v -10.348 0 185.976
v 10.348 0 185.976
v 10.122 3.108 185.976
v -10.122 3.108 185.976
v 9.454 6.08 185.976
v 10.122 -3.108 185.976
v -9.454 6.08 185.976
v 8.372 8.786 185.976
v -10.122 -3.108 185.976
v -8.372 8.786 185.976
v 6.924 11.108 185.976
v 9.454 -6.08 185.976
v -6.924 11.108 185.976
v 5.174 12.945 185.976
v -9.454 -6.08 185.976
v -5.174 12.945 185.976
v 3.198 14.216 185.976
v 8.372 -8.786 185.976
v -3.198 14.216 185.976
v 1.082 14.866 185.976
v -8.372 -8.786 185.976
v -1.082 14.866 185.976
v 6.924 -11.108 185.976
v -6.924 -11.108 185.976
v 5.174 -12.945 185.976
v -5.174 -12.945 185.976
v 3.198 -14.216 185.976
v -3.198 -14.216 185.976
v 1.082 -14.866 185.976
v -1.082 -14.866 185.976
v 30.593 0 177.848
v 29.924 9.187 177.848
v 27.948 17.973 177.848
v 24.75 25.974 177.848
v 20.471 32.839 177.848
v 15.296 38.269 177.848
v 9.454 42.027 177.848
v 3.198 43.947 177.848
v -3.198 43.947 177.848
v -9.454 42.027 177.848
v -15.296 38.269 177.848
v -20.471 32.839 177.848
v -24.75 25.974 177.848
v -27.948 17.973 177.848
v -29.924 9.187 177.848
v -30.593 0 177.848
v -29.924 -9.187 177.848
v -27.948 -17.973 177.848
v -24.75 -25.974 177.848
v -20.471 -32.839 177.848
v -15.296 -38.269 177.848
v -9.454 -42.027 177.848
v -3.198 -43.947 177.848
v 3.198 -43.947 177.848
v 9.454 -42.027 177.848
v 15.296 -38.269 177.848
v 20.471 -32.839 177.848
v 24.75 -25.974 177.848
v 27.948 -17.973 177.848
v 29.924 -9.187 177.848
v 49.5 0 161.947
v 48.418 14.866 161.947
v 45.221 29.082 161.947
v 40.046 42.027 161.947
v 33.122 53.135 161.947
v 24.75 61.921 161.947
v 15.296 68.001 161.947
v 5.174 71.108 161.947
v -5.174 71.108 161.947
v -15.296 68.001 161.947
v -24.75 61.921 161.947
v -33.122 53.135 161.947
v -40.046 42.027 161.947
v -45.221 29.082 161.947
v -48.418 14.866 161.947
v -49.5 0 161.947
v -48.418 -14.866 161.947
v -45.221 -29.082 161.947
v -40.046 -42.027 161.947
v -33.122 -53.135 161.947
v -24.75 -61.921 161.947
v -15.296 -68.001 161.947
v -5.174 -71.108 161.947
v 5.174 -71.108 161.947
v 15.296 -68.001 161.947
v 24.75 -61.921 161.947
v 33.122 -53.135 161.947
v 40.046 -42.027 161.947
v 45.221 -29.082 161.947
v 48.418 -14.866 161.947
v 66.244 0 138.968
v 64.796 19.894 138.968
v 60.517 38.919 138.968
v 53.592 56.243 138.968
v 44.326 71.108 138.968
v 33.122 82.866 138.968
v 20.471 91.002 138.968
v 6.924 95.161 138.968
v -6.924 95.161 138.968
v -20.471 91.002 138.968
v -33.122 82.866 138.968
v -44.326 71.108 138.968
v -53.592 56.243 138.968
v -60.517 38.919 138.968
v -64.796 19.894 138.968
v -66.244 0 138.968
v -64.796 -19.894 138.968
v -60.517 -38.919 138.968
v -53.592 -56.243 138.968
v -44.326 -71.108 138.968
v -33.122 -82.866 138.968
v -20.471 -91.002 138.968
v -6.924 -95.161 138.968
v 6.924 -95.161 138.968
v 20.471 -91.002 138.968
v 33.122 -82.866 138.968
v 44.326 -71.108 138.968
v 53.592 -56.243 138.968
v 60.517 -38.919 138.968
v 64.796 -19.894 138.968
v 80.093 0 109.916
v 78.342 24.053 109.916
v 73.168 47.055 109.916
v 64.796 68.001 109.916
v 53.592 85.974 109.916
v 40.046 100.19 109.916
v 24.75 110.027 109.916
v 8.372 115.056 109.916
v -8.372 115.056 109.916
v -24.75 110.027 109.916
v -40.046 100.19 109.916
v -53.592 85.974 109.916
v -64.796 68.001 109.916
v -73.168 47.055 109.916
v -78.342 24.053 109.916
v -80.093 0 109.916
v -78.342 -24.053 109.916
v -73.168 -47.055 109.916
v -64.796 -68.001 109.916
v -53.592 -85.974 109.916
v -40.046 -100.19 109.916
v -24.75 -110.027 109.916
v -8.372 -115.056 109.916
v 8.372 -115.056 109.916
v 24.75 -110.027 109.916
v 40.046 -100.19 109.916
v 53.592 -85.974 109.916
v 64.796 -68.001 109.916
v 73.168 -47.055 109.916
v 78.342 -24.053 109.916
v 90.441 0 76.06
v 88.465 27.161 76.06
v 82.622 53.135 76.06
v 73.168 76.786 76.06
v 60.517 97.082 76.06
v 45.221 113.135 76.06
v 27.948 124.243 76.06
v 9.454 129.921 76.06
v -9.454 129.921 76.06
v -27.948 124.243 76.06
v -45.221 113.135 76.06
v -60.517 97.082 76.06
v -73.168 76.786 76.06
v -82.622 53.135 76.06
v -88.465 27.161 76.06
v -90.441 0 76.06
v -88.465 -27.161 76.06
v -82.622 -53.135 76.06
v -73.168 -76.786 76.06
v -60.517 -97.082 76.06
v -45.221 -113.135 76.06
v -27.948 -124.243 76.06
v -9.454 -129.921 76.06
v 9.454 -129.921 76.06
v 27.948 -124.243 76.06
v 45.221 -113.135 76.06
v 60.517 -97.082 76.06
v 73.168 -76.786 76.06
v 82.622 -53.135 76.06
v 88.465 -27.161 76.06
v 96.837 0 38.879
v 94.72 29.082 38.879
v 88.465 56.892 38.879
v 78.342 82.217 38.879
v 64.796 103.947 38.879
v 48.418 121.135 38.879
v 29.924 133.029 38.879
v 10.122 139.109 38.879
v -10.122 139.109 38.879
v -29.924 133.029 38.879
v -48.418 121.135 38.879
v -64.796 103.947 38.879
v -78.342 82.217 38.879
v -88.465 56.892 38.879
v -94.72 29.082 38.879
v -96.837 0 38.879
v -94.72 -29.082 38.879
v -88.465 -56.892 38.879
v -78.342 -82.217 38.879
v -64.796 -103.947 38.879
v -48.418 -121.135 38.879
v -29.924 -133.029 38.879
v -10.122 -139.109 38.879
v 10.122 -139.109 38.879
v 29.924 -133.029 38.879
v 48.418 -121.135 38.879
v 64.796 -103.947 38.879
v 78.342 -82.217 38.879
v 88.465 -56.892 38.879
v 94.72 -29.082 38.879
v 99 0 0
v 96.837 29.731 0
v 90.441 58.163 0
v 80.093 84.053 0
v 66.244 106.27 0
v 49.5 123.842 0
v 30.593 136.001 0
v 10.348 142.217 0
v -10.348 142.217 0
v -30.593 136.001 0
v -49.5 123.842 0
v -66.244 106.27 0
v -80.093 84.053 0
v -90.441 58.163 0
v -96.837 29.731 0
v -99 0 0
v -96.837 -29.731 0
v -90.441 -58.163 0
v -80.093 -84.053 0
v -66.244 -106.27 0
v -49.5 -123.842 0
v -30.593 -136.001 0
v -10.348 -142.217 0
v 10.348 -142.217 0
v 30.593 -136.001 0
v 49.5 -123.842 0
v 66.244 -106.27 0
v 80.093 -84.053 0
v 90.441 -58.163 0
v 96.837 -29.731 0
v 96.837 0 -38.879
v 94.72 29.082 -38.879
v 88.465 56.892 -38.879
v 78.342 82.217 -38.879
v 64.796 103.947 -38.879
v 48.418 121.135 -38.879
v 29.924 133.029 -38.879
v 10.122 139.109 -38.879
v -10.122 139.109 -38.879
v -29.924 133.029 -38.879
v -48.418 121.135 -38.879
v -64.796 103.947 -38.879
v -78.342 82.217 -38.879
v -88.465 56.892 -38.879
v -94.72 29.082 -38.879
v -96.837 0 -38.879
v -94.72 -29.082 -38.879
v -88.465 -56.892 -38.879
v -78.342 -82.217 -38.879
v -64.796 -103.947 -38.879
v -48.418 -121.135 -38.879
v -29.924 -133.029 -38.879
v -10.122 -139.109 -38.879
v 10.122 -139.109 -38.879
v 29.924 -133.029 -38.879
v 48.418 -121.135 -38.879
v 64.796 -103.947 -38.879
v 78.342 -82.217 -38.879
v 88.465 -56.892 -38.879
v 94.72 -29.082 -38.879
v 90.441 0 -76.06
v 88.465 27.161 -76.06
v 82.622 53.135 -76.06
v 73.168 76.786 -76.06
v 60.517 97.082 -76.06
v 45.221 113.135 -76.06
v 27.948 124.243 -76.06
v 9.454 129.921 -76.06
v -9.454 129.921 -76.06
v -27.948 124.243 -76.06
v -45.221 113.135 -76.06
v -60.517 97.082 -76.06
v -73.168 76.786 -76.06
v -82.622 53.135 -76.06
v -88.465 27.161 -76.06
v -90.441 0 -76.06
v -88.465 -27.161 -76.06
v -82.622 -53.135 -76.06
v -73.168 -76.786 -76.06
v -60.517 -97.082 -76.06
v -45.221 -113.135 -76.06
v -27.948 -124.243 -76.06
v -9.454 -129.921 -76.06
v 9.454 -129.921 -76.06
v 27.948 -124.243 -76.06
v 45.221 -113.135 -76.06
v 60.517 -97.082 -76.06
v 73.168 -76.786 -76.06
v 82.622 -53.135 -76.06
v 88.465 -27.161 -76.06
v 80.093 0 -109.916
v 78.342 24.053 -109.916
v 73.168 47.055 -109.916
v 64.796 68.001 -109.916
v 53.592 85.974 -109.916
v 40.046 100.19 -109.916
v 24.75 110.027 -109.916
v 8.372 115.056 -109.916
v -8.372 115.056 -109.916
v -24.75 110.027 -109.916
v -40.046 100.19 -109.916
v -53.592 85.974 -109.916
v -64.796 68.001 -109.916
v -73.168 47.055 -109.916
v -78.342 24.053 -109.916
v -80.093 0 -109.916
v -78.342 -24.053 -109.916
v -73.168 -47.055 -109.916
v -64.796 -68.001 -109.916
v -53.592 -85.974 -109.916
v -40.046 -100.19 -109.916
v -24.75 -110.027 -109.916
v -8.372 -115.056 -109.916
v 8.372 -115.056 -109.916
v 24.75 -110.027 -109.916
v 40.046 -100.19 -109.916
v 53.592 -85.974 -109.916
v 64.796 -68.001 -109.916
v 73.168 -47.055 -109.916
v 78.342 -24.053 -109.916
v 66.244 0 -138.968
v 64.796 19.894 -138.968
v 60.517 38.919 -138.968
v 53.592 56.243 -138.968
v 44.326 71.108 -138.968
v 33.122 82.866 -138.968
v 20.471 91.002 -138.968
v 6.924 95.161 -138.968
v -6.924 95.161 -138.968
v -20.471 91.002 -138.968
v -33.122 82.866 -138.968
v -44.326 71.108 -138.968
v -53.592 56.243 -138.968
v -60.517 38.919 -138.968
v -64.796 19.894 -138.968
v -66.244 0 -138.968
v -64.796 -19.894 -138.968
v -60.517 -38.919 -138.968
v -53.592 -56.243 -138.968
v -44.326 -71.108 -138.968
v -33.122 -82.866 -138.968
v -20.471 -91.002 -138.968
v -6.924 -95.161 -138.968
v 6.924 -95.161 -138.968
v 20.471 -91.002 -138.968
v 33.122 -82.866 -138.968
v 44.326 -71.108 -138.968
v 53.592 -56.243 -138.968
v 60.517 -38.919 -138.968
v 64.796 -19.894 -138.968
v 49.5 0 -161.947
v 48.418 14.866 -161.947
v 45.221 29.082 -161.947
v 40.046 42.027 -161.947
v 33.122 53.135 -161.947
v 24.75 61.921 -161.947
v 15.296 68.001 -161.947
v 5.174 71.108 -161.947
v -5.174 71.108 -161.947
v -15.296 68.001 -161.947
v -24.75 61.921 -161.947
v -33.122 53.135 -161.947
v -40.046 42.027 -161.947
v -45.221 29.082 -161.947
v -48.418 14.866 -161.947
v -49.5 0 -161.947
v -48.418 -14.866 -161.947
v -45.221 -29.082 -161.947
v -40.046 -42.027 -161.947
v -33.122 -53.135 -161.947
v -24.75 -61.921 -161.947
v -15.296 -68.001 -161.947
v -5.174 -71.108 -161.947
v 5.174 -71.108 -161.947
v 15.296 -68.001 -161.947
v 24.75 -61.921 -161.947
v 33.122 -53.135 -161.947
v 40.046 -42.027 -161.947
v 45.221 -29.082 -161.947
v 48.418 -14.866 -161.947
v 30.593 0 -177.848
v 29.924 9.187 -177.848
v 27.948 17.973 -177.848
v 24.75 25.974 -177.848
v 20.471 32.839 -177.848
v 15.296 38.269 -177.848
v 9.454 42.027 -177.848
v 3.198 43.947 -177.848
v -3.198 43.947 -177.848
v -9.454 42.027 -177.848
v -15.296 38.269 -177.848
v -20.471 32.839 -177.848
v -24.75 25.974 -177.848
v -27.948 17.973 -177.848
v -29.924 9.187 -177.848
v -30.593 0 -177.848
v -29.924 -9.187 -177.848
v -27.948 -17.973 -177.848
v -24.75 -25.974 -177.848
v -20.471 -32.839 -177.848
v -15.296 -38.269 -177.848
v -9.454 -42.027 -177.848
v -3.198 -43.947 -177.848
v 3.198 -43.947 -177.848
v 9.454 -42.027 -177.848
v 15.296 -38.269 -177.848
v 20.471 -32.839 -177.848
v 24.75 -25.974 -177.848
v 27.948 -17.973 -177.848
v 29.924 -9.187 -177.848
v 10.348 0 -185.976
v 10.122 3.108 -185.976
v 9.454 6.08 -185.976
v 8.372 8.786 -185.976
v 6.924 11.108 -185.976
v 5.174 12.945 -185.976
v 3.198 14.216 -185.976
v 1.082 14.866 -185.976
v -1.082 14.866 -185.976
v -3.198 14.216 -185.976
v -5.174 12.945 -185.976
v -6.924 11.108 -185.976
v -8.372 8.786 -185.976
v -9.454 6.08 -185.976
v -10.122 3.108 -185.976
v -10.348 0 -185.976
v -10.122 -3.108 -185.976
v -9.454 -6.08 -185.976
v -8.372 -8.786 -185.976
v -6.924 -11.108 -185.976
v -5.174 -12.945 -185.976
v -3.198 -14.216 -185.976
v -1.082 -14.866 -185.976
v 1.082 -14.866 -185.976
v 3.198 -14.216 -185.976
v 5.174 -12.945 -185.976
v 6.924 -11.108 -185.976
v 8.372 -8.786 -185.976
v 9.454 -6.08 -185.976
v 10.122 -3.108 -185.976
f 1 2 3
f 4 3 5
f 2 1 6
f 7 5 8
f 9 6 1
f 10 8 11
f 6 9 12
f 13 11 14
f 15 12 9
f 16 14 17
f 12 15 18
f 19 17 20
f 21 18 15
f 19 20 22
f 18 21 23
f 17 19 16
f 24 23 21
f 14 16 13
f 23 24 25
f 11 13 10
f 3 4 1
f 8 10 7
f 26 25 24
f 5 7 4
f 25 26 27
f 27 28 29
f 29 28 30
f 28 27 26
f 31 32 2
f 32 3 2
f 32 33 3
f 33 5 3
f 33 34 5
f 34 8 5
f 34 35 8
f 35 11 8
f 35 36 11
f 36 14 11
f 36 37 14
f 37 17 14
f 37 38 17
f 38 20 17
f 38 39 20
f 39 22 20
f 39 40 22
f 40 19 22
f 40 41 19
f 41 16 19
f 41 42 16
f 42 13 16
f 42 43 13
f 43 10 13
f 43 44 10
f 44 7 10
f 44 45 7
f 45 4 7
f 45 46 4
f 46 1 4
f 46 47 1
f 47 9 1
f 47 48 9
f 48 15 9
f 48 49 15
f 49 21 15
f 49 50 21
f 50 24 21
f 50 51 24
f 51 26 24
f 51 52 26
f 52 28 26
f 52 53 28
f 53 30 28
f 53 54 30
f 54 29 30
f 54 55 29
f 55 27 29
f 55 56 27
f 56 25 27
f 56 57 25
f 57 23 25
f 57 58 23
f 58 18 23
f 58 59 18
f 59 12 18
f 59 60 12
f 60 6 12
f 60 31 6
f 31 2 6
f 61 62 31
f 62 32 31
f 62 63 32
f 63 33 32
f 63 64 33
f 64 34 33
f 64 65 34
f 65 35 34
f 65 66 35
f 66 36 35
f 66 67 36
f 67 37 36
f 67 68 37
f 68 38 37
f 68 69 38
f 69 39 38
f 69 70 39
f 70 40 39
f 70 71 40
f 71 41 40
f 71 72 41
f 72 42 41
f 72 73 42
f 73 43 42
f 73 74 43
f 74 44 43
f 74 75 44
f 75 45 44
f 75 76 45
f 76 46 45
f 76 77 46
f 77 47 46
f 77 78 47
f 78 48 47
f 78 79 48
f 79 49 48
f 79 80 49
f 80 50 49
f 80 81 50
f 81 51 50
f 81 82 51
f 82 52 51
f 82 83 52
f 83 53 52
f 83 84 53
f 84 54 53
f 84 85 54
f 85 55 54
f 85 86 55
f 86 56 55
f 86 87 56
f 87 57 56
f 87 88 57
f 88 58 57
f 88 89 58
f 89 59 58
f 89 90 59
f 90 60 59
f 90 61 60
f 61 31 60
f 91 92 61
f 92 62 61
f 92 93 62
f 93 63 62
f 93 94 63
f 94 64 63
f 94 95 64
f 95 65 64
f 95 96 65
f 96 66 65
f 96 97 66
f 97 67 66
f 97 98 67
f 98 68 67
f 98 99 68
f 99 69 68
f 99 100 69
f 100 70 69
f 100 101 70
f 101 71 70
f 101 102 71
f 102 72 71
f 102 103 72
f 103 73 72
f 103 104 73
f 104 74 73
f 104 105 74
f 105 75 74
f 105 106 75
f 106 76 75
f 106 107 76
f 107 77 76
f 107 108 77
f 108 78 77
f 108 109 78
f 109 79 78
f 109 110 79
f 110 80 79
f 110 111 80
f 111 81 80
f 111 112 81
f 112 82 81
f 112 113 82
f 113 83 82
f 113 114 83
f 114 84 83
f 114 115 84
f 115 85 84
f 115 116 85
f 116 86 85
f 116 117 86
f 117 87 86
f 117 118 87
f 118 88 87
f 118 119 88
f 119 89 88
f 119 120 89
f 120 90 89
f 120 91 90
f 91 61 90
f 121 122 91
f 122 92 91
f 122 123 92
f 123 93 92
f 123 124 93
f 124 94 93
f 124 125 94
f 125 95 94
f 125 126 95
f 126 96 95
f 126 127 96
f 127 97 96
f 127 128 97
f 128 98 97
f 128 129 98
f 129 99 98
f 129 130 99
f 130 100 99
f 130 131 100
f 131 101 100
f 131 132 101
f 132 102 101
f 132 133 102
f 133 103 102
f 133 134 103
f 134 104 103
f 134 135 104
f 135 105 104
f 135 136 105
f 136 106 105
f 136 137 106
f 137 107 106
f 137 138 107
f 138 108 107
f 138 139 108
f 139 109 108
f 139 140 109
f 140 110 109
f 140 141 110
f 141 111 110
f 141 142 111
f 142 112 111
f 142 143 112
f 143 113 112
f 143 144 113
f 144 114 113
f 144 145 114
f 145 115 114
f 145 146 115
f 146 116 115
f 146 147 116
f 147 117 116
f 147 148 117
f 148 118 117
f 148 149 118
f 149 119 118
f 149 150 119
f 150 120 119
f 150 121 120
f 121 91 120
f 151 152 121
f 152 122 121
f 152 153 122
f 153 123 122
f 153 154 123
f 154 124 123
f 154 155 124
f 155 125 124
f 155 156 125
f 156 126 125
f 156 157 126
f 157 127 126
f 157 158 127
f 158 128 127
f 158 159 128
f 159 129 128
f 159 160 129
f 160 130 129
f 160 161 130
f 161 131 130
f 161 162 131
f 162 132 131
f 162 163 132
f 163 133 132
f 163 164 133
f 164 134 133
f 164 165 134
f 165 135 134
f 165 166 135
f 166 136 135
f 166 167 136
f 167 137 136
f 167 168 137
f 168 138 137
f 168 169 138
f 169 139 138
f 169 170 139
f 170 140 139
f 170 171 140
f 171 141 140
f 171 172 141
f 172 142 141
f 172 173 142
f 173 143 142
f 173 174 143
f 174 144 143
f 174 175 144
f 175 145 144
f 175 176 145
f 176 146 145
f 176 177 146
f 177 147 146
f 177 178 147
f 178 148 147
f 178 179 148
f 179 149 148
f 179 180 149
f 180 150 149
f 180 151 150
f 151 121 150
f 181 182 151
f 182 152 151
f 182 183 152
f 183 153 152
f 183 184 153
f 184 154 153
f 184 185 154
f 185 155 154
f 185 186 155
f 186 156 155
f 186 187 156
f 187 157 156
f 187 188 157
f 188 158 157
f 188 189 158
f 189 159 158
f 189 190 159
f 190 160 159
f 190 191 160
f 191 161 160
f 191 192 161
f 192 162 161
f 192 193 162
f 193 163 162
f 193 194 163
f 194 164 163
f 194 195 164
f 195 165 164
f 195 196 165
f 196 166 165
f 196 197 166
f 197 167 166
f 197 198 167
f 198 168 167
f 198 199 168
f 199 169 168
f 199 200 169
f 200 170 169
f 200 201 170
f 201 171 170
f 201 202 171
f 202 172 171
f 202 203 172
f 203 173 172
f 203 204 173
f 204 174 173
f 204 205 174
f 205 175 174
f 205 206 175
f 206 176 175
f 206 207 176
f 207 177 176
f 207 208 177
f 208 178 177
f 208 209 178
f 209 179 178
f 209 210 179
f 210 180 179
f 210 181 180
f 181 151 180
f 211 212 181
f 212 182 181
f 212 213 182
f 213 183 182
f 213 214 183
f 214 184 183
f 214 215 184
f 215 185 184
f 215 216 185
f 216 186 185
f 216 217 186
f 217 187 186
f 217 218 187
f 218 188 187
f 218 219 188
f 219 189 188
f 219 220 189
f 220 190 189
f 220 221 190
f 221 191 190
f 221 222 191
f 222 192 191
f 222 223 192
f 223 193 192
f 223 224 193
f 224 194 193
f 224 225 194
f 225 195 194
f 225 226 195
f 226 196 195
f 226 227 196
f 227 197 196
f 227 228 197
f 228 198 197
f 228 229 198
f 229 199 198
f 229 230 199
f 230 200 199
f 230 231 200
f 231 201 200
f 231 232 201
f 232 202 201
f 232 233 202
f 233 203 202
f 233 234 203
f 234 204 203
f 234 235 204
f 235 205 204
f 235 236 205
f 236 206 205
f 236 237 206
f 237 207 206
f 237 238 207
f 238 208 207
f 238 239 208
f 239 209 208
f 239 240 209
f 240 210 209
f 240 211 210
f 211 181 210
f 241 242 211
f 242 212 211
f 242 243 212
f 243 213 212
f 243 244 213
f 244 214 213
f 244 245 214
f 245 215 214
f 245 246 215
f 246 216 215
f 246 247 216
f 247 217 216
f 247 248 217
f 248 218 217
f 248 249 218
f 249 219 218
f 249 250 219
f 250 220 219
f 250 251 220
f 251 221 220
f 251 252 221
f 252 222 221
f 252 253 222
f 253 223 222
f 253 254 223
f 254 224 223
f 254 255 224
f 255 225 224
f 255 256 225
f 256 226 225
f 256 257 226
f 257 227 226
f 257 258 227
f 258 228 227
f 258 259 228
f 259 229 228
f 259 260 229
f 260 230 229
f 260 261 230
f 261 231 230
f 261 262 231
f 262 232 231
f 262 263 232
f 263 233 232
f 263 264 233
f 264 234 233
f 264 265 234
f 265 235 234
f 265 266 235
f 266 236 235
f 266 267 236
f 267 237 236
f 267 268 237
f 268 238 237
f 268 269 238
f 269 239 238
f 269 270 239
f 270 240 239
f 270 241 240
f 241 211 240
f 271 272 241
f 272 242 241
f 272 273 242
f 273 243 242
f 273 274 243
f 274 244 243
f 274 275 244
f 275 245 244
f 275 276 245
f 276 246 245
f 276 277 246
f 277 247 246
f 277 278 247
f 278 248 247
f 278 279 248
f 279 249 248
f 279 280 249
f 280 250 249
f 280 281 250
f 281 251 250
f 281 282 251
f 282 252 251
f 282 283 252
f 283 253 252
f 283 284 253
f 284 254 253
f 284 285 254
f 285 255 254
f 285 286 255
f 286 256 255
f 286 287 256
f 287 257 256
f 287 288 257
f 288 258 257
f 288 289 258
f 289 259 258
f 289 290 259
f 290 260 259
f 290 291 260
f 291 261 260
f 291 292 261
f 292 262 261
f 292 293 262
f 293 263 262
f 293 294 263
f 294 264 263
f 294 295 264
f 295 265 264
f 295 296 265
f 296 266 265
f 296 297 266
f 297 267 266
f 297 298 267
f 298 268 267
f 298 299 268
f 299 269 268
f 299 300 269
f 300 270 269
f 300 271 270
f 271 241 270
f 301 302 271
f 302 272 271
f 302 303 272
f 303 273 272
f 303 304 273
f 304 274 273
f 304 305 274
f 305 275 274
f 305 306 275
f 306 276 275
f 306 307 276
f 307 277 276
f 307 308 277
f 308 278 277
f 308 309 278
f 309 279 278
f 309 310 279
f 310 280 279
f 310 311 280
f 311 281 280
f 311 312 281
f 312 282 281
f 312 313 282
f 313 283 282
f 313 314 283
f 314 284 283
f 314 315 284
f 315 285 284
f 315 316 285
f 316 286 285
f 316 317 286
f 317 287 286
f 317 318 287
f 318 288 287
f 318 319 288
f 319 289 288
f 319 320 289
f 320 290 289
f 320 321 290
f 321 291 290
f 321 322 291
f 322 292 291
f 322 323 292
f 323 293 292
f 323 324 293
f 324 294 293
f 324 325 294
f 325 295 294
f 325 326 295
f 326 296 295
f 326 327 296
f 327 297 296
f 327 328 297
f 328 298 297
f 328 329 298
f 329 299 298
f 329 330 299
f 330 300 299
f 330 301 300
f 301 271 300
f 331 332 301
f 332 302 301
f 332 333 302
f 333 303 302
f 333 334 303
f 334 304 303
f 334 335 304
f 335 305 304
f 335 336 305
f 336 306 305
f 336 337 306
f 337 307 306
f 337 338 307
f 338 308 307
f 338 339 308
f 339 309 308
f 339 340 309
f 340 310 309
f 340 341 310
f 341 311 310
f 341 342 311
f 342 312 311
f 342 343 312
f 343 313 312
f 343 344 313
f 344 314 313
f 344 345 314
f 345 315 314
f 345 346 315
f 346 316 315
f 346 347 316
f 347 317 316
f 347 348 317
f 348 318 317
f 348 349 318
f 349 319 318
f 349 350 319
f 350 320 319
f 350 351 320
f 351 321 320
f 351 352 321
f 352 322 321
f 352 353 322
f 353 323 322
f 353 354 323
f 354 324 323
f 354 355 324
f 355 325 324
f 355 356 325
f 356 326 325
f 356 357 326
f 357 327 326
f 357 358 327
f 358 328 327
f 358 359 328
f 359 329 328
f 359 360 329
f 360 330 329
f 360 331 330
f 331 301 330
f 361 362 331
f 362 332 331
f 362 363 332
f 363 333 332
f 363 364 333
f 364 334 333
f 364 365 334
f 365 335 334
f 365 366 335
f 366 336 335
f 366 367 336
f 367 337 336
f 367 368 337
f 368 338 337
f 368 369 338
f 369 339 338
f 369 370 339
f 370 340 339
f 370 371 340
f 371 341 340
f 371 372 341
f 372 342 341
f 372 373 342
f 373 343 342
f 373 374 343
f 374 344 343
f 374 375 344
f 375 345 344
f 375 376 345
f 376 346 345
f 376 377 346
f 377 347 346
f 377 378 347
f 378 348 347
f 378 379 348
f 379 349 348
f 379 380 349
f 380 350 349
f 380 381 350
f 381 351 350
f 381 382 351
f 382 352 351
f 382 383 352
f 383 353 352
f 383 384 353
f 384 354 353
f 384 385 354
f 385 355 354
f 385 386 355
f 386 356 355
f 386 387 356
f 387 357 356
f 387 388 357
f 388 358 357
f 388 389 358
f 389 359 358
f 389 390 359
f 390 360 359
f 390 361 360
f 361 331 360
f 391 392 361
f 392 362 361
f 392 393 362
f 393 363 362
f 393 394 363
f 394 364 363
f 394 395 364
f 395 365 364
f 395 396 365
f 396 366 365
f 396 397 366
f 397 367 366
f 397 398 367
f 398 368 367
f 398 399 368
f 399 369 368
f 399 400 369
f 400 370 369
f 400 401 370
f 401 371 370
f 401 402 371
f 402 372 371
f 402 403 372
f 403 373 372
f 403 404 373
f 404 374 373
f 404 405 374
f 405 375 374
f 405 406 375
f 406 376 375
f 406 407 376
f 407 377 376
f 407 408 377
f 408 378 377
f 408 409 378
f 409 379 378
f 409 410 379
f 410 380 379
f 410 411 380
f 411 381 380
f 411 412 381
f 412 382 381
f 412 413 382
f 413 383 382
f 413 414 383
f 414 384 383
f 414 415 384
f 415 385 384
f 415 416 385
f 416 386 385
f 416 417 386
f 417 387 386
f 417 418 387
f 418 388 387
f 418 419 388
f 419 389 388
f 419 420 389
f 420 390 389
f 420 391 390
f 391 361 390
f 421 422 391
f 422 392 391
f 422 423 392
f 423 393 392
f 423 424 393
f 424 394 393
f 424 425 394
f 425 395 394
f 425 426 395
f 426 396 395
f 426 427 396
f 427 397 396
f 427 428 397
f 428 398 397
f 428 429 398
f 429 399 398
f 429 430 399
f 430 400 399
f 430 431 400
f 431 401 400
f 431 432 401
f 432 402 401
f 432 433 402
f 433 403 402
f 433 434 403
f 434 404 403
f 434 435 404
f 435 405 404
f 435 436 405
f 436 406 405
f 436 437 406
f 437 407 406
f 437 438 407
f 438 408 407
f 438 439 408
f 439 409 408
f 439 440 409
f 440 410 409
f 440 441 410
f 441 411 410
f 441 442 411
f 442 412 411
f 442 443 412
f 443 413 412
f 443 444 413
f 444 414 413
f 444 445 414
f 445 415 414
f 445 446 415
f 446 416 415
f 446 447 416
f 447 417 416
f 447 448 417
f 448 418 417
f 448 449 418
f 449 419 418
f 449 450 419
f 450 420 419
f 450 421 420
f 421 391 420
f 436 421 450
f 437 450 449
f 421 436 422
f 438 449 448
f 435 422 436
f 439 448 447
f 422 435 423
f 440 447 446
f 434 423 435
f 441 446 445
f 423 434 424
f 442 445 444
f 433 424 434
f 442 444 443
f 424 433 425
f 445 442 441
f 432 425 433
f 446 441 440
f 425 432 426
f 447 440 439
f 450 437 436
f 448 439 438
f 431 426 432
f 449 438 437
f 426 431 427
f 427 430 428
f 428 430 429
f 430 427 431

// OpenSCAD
// Generated by SolidPython 1.0.1 on 2020-07-29 00:46:49


scale(v = [9, 13, 17]) {
	sphere(r = 11);
}
/***********************************************
*********      SolidPython code:      **********
************************************************
 
# import packages: SolidPython
from solid import *
from solid.utils import *
from itertools import chain, combinations, permutations


class Resize:

    def __init__(self, scad_file):
        self.scad_file = scad_file
        #self.scad_file = import_scad(scad_file)
        # cone/cylinder param:
        self.r1 = 0
        self.r2 = 0
        self.h = 0
        # rectangular prism param:
        self.w = 0
        self.l = 0
        # ellipse param:
        self.r = 0

    # import OpenScad code (file name corresponds to shape)


    # classify shape + parameters
    def assign(self, param1, param2, param3):
        if self.scad_file == 'cone.scad':
            self.r1 = param1
            self.r2 = param2
            self.h = param3
        elif self.scad_file == 'cylinder.scad':
            self.r1 = param1
            self.r2 = param2
            self.h = param3
        elif self.scad_file == 'rectangularPrism.scad':
            self.h = param1
            self.l = param2
            self.w = param3
        else:
            self.r = param1
            self.h = param2

    # resize parameters
    def iterate(self):
        x = range(3, 20, 2)
        i = 1
        if self.scad_file == 'cone.scad':
            tempList = list(permutations(x, 2))
            for temp in tempList:
                param1 = temp[0]
                param2 = temp[1]
                filepath = 'produced_scad_files/' + 'cone' + str(param1) + '_' + str(param2) + '_' + '.scad'
                scad_render_to_file(cylinder(h=param1, r1=param2, r2=0), filepath)

        elif self.scad_file == 'cylinder.scad':
            tempList = list(permutations(x, 3))
            for temp in tempList:
                param1 = temp[0]
                param2 = temp[1]
                filepath = 'produced_scad_files/' + 'cylinder' + str(param1) + '_' + str(param2) + '_' + '.scad'
                scad_render_to_file(cylinder(h=param1, r1=param2, r2=param2), filepath)

        elif self.scad_file == 'rectangularPrism.scad':
            tempList = list(permutations(x, 3))
            for temp in tempList:
                param1 = temp[0]
                param2 = temp[1]
                param3 = temp[2]
                filepath = 'produced_scad_files/' + 'rectangularPrism' + str(param1) + '_' + str(param2) + '_' + str(
                    param3) + '.scad'
                scad_render_to_file(cube(size=(param1, param2, param3)), filepath)

        elif self.scad_file == 'ellipse.scad':
            tempList = list(permutations(x, 4))
            for temp in tempList:
                param1 = temp[0]
                param2 = temp[1]
                param3 = temp[2]
                param4 = temp[3]
                filepath = 'produced_scad_files/' + 'ellipse' + str(param1) + '_' + str(param2) + '_' + str(param3) + '_' + str(param4) + '.scad'
                scad_render_to_file(scale([param1, param2, param3])(sphere(r=param4)), filepath)

    def render_to_scadfile(self):
        scad_render_to_file(scad, 'example.scad') 
 
************************************************/
